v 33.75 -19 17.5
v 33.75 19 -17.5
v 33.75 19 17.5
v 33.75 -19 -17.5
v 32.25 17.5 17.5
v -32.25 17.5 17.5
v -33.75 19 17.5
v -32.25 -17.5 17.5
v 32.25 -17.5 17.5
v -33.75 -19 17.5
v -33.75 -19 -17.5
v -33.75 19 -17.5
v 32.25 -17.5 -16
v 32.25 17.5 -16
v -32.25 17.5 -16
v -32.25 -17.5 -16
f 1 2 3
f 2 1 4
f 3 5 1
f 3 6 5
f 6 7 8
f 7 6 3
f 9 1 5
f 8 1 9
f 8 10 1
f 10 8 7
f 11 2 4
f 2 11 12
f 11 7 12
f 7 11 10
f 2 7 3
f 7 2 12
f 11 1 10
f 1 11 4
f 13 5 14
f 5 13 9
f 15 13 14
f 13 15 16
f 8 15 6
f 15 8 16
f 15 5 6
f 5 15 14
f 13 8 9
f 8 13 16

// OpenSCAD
boxSize = [67.5, 38];
boxHeight = 35;
wallThickness = 1.5;
floorThickness = 1.5;

difference() {
    box = concat(boxSize, [boxHeight]);
    cube(size = box, center = true);

    cutoutInset = wallThickness * 2;
    cutout = [
        boxSize[0] - cutoutInset,
        boxSize[1] - cutoutInset,
        boxHeight,
    ];
    translate(v = [0, 0, floorThickness]) 
    cube(size = cutout, center = true);
}
